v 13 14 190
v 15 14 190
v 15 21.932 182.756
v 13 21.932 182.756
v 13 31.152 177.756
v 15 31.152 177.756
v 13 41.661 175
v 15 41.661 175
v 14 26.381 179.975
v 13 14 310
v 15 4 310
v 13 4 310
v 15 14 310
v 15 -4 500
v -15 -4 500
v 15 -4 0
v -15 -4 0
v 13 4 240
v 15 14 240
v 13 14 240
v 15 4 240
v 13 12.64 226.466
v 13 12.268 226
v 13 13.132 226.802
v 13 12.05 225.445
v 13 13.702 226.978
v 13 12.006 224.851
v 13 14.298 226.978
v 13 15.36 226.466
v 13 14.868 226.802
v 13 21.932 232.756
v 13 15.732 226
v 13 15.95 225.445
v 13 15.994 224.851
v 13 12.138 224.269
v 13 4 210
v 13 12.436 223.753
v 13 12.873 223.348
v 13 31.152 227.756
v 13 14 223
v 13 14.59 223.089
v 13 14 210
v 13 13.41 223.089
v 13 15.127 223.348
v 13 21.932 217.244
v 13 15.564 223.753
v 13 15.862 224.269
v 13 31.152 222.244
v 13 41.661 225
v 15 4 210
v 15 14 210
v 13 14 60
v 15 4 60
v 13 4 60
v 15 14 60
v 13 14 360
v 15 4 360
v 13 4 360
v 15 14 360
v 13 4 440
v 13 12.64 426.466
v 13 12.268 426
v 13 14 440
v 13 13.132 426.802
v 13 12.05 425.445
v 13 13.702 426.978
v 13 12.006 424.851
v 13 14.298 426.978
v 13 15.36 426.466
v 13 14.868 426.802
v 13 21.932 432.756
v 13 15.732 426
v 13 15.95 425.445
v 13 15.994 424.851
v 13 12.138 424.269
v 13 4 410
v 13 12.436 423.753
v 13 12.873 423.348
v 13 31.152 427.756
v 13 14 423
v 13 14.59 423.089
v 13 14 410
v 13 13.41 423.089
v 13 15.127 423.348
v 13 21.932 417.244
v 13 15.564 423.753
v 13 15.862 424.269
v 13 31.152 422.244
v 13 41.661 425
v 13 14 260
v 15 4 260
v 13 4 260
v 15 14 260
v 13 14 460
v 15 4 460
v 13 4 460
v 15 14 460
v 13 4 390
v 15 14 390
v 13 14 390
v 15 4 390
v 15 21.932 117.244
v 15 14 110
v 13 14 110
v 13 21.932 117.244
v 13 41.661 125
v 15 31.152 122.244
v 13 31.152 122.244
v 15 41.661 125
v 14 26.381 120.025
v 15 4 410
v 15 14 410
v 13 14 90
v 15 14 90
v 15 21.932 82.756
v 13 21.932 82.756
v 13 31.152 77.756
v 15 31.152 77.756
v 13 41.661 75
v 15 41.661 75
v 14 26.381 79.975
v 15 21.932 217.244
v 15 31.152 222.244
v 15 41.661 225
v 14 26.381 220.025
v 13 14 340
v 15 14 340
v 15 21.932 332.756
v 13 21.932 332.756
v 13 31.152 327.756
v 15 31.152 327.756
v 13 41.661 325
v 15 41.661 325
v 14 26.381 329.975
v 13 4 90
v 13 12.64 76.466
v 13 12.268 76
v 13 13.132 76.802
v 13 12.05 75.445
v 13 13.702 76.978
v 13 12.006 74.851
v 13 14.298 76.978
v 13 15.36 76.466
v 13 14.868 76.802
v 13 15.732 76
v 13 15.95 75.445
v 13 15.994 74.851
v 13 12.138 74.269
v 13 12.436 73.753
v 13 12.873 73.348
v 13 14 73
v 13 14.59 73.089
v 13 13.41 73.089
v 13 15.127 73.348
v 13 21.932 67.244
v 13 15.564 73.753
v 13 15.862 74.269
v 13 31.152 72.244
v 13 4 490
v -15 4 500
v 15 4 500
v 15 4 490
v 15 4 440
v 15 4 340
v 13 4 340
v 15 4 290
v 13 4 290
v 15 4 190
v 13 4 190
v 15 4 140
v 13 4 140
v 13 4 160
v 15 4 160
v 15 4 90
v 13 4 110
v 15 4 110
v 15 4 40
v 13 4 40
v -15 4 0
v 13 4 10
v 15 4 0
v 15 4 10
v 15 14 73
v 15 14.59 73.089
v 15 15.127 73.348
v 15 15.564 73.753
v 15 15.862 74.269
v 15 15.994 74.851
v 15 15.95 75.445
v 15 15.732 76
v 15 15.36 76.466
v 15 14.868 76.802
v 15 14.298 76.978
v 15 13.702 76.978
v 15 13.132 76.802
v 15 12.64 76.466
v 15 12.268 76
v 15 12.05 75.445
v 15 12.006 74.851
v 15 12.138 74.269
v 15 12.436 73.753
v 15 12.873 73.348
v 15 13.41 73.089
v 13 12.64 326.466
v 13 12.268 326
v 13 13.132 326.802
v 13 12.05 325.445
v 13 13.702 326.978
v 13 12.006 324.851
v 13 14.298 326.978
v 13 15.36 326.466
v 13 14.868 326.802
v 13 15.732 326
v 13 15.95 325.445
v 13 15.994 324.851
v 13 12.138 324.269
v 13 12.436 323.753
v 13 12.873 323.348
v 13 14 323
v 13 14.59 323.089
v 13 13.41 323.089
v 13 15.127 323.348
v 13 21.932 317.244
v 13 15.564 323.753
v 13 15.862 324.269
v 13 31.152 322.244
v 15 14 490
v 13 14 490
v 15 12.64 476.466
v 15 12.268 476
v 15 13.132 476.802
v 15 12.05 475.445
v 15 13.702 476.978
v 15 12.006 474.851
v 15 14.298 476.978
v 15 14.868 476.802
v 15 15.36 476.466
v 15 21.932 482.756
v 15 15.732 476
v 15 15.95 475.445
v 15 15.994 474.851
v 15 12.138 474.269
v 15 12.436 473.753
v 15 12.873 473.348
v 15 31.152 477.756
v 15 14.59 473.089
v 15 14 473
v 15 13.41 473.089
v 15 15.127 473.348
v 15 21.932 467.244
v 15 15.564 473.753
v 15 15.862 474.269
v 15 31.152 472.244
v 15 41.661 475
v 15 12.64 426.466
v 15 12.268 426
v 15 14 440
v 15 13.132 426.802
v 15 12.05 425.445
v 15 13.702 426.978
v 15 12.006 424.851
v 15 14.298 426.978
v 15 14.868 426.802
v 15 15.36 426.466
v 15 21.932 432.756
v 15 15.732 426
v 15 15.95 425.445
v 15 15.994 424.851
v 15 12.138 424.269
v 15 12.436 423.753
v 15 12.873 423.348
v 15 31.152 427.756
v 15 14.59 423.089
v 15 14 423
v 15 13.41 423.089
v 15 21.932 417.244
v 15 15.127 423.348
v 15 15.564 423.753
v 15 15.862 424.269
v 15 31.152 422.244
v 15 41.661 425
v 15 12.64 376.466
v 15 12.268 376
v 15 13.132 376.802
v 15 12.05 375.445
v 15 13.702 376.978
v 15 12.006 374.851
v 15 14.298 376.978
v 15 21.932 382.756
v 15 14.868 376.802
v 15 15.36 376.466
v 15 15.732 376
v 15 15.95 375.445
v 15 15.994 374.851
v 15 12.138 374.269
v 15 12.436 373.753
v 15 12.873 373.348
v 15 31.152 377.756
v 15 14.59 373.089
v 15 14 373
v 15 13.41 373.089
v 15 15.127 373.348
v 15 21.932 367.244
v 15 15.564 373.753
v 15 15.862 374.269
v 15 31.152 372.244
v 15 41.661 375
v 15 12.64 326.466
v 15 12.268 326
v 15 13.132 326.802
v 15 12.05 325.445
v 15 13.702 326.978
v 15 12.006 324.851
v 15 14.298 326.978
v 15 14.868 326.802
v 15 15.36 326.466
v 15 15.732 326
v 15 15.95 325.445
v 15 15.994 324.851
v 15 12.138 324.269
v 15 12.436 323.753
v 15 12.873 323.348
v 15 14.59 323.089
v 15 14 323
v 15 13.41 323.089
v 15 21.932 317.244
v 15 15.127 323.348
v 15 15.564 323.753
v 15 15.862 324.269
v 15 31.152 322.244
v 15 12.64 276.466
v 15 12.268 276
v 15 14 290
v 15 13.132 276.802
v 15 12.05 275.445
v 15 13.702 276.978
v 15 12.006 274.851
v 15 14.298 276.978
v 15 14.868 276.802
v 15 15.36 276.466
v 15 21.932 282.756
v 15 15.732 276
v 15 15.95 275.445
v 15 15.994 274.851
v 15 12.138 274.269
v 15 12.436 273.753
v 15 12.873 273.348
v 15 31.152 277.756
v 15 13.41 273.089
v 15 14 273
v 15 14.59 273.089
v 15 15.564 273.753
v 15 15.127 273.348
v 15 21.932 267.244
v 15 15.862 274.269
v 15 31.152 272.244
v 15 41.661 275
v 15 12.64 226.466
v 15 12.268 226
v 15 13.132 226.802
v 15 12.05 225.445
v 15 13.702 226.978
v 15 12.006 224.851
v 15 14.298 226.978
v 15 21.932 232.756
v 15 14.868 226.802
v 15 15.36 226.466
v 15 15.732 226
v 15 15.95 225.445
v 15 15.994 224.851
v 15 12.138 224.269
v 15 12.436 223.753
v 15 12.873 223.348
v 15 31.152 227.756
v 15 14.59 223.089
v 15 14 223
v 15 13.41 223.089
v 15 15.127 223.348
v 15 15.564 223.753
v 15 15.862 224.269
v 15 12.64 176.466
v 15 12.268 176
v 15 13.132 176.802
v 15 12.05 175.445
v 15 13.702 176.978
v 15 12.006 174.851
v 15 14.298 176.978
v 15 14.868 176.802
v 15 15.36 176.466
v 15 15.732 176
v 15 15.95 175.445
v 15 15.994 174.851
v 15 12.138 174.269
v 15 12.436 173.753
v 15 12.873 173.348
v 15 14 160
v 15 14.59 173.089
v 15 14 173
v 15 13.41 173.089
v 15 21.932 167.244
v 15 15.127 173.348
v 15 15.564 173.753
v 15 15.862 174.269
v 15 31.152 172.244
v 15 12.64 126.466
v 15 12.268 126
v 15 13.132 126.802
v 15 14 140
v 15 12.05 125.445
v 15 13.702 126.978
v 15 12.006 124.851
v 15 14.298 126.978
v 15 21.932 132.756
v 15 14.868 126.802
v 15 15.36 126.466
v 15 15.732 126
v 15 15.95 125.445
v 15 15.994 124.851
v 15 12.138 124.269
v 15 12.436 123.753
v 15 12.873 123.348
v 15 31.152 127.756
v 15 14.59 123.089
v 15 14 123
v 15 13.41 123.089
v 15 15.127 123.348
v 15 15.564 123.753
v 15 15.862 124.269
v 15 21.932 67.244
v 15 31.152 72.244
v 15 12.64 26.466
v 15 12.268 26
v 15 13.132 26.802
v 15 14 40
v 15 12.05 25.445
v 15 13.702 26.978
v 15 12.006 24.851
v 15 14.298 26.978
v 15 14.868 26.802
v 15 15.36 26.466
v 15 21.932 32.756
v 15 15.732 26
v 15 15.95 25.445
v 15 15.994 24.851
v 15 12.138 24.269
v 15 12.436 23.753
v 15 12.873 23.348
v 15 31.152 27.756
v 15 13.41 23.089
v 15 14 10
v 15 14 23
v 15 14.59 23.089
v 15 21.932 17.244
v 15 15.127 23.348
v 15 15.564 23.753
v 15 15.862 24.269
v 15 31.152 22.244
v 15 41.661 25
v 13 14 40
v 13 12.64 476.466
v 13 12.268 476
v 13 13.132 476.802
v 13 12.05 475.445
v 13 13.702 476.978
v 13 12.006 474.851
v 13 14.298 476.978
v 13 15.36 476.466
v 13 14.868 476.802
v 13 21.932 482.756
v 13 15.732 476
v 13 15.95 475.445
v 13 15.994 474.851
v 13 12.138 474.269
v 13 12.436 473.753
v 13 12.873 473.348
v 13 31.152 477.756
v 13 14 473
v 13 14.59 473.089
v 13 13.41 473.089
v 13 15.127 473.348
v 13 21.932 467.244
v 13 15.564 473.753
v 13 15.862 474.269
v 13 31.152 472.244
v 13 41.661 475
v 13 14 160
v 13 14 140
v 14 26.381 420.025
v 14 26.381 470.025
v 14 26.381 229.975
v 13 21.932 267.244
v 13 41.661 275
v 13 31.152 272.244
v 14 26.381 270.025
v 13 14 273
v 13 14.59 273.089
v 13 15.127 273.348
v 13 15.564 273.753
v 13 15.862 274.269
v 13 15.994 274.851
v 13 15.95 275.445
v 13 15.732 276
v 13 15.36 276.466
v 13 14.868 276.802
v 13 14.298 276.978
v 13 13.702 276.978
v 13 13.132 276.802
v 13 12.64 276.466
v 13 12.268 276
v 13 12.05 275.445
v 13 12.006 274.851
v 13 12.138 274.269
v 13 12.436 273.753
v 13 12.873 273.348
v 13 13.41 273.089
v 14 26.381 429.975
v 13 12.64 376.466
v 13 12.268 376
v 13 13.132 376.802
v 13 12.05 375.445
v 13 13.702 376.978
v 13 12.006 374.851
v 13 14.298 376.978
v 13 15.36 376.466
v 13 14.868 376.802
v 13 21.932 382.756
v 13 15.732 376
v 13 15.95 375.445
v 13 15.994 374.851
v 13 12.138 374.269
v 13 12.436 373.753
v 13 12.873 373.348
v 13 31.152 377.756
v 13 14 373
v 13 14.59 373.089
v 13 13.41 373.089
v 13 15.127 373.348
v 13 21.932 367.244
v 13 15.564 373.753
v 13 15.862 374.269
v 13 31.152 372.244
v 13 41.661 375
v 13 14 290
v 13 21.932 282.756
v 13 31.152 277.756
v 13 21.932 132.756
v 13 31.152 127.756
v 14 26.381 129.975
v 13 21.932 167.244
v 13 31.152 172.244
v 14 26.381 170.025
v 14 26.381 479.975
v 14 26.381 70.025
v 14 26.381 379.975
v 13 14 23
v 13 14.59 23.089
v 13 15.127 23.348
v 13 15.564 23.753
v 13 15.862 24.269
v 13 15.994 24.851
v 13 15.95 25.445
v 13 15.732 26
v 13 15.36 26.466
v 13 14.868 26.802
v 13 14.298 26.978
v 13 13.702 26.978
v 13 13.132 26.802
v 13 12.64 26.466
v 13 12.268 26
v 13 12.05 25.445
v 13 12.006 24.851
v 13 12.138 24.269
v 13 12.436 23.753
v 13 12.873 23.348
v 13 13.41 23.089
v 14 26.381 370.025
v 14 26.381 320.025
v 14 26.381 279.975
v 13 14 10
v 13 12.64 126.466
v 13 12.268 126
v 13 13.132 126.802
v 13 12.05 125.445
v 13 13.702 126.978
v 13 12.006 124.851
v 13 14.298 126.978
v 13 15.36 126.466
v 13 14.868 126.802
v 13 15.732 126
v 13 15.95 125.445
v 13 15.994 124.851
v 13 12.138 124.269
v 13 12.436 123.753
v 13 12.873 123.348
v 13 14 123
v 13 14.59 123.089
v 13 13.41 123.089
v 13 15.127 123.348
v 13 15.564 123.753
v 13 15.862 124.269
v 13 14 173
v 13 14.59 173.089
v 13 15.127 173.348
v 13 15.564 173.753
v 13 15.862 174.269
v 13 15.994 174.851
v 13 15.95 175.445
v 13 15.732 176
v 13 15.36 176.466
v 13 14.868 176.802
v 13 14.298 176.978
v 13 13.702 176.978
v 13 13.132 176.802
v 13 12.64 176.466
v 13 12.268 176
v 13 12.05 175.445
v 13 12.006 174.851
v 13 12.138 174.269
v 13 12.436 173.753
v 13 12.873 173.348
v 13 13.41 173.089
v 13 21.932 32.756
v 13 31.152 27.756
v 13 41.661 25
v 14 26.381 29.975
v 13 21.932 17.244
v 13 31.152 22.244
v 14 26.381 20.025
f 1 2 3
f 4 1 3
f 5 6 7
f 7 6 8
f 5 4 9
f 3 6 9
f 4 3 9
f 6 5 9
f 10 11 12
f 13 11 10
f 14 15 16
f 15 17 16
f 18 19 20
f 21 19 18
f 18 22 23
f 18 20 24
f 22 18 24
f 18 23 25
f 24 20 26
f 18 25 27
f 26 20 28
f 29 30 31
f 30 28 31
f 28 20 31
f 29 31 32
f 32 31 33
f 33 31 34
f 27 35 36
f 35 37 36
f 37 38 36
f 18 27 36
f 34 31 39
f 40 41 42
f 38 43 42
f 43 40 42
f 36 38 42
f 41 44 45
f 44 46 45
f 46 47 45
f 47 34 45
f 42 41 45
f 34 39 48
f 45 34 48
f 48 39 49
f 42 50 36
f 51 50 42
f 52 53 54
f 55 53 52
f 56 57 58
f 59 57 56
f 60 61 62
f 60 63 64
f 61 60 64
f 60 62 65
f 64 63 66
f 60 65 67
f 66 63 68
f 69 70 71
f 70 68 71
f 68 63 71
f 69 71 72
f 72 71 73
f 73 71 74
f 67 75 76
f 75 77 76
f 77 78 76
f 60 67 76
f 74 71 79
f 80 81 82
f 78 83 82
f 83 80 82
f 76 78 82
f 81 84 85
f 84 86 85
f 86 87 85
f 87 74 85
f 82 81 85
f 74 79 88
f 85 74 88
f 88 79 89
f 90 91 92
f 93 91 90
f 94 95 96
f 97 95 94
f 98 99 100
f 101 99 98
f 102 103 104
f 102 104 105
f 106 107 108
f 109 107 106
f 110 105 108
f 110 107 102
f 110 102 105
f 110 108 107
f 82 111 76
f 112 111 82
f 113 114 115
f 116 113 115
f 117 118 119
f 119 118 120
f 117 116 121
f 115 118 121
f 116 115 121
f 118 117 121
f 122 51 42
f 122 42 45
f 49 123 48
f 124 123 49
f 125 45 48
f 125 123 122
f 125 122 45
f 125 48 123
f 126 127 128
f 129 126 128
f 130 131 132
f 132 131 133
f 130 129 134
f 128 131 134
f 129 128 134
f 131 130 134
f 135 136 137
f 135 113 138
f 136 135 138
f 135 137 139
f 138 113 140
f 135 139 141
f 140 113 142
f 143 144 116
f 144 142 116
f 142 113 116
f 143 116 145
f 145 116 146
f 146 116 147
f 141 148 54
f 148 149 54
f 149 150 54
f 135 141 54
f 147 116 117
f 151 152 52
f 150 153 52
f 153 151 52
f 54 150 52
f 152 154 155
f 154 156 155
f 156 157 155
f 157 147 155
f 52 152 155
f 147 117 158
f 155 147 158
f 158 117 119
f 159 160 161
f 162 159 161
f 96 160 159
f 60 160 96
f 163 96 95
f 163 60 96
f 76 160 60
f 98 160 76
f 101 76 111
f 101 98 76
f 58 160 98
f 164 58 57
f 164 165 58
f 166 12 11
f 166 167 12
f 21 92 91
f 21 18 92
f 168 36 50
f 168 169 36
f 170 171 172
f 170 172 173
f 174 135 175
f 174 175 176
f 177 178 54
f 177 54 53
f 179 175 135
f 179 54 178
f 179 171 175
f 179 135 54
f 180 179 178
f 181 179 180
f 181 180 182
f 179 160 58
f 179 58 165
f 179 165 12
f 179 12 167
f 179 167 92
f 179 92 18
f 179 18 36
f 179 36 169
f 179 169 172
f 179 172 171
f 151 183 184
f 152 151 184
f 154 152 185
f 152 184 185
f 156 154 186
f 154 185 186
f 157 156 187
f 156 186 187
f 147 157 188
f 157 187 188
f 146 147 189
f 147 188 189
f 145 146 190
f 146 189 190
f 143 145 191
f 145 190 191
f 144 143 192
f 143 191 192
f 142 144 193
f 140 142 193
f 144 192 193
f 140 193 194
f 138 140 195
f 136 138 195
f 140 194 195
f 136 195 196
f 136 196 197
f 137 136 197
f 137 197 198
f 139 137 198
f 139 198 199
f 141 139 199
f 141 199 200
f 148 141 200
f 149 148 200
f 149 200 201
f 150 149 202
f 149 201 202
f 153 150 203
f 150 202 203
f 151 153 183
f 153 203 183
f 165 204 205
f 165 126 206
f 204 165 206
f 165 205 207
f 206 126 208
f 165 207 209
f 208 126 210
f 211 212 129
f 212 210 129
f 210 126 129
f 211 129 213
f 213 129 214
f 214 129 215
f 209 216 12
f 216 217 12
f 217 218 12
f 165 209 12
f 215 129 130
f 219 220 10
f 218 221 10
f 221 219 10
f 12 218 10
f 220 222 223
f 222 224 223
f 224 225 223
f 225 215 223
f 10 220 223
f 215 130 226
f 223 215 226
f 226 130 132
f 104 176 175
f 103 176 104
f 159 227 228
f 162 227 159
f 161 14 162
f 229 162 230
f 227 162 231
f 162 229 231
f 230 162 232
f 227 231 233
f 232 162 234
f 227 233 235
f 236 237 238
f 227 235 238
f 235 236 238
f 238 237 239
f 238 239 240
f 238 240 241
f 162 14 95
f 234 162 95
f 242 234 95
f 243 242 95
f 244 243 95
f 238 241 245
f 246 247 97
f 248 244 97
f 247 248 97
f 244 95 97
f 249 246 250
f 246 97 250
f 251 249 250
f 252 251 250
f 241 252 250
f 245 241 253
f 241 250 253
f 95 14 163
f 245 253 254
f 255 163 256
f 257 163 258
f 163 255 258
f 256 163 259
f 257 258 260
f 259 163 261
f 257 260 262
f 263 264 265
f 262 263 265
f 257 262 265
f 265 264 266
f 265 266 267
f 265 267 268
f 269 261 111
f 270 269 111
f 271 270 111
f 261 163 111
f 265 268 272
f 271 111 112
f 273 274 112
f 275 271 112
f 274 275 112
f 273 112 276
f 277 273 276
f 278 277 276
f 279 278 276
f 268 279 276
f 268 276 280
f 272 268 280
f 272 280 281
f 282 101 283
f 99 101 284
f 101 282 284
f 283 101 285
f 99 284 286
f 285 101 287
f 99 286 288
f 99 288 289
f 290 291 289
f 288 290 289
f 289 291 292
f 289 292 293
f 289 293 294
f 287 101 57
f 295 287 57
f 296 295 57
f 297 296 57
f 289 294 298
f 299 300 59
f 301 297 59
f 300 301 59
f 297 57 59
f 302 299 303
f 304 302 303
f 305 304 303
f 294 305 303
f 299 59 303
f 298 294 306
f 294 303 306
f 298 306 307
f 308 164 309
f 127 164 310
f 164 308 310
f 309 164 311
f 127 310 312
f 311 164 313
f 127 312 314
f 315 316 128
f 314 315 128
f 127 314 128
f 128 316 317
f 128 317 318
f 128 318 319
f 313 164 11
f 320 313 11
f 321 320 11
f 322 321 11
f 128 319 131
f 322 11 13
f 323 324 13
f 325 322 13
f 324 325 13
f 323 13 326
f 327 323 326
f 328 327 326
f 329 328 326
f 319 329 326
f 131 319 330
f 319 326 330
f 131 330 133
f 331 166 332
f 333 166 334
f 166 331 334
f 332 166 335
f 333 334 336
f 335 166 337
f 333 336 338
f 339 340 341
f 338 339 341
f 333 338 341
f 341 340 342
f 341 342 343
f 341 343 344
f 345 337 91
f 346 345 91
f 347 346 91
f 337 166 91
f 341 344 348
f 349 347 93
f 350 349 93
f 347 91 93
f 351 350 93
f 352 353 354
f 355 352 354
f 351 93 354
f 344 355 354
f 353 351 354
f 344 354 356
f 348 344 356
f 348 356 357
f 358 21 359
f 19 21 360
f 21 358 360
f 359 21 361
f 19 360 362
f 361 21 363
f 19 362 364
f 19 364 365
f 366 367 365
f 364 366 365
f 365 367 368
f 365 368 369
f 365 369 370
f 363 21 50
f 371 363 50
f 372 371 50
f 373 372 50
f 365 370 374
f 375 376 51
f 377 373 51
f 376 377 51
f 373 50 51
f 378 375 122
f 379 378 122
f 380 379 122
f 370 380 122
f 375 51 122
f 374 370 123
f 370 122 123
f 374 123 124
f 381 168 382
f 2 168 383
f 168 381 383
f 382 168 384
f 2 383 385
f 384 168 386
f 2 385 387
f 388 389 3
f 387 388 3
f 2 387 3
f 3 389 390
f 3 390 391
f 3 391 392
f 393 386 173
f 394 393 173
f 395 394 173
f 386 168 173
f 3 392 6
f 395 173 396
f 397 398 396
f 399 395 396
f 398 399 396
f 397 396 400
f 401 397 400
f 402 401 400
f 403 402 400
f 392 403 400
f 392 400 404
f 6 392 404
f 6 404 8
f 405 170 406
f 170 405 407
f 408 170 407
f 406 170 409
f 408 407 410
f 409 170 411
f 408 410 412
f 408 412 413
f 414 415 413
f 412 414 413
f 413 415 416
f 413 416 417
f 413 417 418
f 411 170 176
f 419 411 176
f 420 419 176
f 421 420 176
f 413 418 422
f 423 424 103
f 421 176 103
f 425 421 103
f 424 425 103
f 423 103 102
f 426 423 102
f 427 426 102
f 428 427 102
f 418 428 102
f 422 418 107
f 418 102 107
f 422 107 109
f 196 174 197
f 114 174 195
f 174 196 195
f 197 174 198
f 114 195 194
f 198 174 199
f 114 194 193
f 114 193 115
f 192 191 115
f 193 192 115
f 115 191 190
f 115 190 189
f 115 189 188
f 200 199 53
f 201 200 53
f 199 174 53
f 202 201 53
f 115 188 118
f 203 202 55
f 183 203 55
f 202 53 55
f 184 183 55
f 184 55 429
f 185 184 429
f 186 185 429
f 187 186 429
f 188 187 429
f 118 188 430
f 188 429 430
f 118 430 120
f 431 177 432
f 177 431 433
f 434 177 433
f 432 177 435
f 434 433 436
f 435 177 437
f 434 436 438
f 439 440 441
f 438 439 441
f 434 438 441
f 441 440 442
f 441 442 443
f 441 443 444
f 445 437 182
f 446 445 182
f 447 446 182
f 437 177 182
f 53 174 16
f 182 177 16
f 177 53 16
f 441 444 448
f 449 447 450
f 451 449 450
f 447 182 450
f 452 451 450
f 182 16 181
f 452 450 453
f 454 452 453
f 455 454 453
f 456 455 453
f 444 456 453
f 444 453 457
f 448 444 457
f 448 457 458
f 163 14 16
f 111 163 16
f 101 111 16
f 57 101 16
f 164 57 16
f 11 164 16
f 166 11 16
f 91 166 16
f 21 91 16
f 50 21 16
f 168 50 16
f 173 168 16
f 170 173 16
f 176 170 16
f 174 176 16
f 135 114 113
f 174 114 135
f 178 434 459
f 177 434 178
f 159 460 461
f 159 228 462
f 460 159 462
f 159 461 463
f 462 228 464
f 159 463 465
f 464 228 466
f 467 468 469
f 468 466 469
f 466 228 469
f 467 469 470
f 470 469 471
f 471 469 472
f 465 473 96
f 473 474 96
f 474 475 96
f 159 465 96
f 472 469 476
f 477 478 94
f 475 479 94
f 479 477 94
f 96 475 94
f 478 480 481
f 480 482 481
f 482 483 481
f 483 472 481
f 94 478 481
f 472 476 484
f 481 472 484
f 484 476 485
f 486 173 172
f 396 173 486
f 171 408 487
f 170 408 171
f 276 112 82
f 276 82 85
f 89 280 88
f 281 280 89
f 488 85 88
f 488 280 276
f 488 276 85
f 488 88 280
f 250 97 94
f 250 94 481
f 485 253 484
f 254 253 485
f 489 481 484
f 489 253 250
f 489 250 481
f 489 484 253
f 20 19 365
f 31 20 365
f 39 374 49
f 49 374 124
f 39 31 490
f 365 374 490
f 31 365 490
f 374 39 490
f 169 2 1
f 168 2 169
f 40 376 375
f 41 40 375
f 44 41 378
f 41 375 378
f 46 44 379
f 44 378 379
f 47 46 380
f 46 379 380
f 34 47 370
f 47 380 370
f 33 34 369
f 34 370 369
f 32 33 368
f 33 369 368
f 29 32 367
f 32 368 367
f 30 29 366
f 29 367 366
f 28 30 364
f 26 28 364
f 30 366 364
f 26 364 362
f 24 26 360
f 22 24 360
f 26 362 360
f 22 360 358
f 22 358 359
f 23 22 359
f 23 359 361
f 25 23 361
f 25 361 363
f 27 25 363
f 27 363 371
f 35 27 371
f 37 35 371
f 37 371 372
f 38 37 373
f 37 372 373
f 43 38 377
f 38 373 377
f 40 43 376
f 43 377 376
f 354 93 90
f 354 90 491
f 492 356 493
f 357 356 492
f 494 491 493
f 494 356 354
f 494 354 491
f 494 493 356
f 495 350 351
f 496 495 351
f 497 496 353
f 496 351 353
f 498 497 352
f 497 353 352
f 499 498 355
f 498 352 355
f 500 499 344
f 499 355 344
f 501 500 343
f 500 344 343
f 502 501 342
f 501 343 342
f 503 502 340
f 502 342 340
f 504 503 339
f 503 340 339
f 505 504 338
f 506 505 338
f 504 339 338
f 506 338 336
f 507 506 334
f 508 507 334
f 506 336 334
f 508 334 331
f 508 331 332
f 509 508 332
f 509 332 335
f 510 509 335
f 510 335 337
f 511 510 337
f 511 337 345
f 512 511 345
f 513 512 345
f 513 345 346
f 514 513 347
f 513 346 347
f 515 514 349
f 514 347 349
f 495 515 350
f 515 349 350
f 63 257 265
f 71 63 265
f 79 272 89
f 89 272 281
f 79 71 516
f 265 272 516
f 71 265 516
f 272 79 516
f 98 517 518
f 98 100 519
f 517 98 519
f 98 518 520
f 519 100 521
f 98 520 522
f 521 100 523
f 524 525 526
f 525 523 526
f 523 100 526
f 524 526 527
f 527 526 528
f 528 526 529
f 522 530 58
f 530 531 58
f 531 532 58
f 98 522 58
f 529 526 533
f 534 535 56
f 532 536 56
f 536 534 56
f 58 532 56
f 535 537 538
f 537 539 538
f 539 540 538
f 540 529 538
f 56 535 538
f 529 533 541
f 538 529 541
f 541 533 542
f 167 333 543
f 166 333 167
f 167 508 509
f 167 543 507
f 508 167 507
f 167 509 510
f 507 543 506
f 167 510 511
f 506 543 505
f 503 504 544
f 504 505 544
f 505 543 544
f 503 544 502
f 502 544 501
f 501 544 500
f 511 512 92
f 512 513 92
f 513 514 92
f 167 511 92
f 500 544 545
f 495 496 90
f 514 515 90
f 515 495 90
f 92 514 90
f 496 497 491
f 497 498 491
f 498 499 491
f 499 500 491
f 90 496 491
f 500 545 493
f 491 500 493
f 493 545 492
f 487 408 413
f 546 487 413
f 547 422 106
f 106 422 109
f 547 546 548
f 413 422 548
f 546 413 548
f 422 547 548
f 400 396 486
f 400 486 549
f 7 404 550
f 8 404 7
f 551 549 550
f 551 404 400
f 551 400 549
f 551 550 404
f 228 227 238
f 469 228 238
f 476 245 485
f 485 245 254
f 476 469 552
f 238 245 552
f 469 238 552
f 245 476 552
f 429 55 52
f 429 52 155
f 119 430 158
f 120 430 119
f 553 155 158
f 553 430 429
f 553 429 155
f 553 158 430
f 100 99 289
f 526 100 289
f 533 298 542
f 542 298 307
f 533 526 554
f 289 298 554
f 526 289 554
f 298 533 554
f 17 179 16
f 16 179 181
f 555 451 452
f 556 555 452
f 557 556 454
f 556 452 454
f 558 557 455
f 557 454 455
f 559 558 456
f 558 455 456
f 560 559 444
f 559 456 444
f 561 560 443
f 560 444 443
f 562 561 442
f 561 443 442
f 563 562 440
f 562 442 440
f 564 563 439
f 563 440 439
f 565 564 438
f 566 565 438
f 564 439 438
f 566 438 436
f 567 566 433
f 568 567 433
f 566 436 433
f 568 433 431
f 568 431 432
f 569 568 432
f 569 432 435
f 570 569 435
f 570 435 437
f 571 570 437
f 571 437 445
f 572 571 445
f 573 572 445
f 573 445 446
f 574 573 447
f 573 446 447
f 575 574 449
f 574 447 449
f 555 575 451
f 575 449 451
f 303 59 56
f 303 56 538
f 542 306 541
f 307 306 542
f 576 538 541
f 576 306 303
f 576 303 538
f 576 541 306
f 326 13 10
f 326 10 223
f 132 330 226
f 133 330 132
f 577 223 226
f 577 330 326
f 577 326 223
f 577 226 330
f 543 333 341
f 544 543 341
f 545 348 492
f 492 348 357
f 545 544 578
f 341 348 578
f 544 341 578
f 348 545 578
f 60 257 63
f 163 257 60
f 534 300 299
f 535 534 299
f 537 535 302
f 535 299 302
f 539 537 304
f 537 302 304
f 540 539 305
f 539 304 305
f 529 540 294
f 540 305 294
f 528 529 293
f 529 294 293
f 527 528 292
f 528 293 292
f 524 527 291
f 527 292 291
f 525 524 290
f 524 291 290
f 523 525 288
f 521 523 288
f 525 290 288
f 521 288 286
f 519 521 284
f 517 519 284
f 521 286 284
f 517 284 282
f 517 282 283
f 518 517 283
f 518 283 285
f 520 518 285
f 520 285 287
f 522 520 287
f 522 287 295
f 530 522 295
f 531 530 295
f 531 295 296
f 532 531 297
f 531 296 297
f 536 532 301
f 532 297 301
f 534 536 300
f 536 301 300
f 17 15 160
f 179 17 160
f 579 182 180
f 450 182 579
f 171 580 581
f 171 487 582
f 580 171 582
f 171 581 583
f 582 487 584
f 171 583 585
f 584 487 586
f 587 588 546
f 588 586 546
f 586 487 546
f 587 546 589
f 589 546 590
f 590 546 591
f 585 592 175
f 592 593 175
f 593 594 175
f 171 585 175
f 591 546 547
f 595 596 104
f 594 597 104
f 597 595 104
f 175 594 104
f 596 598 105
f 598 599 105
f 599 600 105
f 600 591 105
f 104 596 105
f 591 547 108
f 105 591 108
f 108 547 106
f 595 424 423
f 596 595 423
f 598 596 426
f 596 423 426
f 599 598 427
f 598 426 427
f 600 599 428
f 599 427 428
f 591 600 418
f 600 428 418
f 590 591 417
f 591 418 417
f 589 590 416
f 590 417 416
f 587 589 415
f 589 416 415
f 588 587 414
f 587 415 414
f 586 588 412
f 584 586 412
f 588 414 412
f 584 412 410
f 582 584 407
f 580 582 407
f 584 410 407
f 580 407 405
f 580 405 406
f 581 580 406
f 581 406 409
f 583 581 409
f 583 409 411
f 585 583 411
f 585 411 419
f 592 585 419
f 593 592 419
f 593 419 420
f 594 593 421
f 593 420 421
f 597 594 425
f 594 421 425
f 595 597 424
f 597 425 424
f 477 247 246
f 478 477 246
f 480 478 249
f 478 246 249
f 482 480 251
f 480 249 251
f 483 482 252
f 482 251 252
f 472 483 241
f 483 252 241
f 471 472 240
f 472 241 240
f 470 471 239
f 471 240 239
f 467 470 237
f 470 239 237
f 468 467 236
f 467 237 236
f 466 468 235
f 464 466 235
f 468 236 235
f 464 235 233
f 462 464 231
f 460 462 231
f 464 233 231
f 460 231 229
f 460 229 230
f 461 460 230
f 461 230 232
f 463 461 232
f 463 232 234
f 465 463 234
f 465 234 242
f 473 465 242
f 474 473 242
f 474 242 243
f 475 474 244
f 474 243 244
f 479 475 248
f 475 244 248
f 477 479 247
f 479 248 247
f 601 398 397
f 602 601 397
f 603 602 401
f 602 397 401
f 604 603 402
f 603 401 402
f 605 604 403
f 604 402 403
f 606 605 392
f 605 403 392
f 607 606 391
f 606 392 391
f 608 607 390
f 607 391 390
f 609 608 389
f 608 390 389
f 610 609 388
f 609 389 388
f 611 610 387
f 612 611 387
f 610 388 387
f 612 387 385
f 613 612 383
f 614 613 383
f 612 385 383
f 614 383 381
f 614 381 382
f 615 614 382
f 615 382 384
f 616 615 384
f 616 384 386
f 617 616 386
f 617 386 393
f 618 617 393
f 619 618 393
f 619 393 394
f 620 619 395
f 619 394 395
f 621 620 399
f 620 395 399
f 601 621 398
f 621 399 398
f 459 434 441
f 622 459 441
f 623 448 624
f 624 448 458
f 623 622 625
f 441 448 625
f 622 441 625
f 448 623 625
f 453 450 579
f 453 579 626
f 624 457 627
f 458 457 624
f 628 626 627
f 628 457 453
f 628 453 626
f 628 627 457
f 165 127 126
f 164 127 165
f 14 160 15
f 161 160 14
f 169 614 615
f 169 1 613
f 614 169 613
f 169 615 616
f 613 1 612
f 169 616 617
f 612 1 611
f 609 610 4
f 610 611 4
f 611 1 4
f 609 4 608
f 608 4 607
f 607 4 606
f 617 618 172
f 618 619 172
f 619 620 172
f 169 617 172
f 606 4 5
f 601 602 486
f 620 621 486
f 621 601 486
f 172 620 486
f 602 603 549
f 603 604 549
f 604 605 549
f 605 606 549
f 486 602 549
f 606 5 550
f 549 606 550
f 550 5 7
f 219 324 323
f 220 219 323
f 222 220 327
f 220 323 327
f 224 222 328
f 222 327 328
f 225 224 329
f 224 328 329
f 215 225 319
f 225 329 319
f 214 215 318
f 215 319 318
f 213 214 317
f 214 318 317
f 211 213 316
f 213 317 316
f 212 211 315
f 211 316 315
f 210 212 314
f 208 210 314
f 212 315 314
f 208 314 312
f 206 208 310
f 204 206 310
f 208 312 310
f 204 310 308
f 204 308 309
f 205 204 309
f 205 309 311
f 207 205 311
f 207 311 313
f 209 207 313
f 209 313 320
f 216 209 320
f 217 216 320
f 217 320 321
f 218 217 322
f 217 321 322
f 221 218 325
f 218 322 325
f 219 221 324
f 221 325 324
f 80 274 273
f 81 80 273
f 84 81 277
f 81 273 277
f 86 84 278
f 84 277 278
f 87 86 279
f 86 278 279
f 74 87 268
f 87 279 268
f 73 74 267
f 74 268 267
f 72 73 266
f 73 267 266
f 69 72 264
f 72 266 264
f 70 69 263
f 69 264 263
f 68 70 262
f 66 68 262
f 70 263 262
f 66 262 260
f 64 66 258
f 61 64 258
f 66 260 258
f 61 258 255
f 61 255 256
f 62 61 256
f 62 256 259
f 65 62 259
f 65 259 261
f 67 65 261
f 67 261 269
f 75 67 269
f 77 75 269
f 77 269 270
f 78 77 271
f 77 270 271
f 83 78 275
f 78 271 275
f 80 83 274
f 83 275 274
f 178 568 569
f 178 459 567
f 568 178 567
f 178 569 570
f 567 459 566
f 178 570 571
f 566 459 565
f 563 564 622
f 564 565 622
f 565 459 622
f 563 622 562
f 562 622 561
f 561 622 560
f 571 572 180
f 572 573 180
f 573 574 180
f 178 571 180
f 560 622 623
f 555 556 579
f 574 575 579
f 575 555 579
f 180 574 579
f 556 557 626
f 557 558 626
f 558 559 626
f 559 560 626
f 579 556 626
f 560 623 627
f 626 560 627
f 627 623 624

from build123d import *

# Parameters (mm, degrees)
SKETCH1_W           = 30
SKETCH1_H           = 8
BOSS_EXTRUDE1_DEPTH = 50
SKETCH2_R           = 2
BOSS_EXTRUDE2_DEPTH = 2
LPATTERN1_COUNT     = 10
LPATTERN1_PITCH     = 50


with BuildPart() as part:
    # Sketch1 → Boss-Extrude1 (new body)
    with BuildSketch(Plane.XY):
        Rectangle(SKETCH1_W, SKETCH1_H)
    boss_extrude1 = extrude(amount=BOSS_EXTRUDE1_DEPTH)

    # Sketch2 → Boss-Extrude2 (add)
    with BuildSketch(Plane(origin=(15, 0, 0), x_dir=(0, 0, -1), z_dir=(1, 0, 0))):
        with BuildLine():
            Line((-40, 14), (-40, 4))
            Line((-40, 4), (-10, 4))
            Line((-10, 4), (-10, 14))
            add(Edge.make_bspline(
                [(-10, 14), (-22.549212794, 24.931170197), (-25, 41.661304797)],
                knots=[0, 0, 0, 1, 1, 1], degree=2))
            add(Edge.make_bspline(
                [(-40, 14), (-27.450787206, 24.931170197), (-25, 41.661304797)],
                knots=[0, 0, 0, 1, 1, 1], degree=2))
        make_face()
        with Locations((-25, 14)):
            Circle(SKETCH2_R, mode=Mode.SUBTRACT)
    boss_extrude2 = extrude(amount=-BOSS_EXTRUDE2_DEPTH)

    # LPattern1: Boss-Extrude1, Boss-Extrude2 ×10
    with Locations(*[(0, 0, i * LPATTERN1_PITCH) for i in range(1, LPATTERN1_COUNT)]):
        add(boss_extrude1)
        add(boss_extrude2)


solid = part.part
